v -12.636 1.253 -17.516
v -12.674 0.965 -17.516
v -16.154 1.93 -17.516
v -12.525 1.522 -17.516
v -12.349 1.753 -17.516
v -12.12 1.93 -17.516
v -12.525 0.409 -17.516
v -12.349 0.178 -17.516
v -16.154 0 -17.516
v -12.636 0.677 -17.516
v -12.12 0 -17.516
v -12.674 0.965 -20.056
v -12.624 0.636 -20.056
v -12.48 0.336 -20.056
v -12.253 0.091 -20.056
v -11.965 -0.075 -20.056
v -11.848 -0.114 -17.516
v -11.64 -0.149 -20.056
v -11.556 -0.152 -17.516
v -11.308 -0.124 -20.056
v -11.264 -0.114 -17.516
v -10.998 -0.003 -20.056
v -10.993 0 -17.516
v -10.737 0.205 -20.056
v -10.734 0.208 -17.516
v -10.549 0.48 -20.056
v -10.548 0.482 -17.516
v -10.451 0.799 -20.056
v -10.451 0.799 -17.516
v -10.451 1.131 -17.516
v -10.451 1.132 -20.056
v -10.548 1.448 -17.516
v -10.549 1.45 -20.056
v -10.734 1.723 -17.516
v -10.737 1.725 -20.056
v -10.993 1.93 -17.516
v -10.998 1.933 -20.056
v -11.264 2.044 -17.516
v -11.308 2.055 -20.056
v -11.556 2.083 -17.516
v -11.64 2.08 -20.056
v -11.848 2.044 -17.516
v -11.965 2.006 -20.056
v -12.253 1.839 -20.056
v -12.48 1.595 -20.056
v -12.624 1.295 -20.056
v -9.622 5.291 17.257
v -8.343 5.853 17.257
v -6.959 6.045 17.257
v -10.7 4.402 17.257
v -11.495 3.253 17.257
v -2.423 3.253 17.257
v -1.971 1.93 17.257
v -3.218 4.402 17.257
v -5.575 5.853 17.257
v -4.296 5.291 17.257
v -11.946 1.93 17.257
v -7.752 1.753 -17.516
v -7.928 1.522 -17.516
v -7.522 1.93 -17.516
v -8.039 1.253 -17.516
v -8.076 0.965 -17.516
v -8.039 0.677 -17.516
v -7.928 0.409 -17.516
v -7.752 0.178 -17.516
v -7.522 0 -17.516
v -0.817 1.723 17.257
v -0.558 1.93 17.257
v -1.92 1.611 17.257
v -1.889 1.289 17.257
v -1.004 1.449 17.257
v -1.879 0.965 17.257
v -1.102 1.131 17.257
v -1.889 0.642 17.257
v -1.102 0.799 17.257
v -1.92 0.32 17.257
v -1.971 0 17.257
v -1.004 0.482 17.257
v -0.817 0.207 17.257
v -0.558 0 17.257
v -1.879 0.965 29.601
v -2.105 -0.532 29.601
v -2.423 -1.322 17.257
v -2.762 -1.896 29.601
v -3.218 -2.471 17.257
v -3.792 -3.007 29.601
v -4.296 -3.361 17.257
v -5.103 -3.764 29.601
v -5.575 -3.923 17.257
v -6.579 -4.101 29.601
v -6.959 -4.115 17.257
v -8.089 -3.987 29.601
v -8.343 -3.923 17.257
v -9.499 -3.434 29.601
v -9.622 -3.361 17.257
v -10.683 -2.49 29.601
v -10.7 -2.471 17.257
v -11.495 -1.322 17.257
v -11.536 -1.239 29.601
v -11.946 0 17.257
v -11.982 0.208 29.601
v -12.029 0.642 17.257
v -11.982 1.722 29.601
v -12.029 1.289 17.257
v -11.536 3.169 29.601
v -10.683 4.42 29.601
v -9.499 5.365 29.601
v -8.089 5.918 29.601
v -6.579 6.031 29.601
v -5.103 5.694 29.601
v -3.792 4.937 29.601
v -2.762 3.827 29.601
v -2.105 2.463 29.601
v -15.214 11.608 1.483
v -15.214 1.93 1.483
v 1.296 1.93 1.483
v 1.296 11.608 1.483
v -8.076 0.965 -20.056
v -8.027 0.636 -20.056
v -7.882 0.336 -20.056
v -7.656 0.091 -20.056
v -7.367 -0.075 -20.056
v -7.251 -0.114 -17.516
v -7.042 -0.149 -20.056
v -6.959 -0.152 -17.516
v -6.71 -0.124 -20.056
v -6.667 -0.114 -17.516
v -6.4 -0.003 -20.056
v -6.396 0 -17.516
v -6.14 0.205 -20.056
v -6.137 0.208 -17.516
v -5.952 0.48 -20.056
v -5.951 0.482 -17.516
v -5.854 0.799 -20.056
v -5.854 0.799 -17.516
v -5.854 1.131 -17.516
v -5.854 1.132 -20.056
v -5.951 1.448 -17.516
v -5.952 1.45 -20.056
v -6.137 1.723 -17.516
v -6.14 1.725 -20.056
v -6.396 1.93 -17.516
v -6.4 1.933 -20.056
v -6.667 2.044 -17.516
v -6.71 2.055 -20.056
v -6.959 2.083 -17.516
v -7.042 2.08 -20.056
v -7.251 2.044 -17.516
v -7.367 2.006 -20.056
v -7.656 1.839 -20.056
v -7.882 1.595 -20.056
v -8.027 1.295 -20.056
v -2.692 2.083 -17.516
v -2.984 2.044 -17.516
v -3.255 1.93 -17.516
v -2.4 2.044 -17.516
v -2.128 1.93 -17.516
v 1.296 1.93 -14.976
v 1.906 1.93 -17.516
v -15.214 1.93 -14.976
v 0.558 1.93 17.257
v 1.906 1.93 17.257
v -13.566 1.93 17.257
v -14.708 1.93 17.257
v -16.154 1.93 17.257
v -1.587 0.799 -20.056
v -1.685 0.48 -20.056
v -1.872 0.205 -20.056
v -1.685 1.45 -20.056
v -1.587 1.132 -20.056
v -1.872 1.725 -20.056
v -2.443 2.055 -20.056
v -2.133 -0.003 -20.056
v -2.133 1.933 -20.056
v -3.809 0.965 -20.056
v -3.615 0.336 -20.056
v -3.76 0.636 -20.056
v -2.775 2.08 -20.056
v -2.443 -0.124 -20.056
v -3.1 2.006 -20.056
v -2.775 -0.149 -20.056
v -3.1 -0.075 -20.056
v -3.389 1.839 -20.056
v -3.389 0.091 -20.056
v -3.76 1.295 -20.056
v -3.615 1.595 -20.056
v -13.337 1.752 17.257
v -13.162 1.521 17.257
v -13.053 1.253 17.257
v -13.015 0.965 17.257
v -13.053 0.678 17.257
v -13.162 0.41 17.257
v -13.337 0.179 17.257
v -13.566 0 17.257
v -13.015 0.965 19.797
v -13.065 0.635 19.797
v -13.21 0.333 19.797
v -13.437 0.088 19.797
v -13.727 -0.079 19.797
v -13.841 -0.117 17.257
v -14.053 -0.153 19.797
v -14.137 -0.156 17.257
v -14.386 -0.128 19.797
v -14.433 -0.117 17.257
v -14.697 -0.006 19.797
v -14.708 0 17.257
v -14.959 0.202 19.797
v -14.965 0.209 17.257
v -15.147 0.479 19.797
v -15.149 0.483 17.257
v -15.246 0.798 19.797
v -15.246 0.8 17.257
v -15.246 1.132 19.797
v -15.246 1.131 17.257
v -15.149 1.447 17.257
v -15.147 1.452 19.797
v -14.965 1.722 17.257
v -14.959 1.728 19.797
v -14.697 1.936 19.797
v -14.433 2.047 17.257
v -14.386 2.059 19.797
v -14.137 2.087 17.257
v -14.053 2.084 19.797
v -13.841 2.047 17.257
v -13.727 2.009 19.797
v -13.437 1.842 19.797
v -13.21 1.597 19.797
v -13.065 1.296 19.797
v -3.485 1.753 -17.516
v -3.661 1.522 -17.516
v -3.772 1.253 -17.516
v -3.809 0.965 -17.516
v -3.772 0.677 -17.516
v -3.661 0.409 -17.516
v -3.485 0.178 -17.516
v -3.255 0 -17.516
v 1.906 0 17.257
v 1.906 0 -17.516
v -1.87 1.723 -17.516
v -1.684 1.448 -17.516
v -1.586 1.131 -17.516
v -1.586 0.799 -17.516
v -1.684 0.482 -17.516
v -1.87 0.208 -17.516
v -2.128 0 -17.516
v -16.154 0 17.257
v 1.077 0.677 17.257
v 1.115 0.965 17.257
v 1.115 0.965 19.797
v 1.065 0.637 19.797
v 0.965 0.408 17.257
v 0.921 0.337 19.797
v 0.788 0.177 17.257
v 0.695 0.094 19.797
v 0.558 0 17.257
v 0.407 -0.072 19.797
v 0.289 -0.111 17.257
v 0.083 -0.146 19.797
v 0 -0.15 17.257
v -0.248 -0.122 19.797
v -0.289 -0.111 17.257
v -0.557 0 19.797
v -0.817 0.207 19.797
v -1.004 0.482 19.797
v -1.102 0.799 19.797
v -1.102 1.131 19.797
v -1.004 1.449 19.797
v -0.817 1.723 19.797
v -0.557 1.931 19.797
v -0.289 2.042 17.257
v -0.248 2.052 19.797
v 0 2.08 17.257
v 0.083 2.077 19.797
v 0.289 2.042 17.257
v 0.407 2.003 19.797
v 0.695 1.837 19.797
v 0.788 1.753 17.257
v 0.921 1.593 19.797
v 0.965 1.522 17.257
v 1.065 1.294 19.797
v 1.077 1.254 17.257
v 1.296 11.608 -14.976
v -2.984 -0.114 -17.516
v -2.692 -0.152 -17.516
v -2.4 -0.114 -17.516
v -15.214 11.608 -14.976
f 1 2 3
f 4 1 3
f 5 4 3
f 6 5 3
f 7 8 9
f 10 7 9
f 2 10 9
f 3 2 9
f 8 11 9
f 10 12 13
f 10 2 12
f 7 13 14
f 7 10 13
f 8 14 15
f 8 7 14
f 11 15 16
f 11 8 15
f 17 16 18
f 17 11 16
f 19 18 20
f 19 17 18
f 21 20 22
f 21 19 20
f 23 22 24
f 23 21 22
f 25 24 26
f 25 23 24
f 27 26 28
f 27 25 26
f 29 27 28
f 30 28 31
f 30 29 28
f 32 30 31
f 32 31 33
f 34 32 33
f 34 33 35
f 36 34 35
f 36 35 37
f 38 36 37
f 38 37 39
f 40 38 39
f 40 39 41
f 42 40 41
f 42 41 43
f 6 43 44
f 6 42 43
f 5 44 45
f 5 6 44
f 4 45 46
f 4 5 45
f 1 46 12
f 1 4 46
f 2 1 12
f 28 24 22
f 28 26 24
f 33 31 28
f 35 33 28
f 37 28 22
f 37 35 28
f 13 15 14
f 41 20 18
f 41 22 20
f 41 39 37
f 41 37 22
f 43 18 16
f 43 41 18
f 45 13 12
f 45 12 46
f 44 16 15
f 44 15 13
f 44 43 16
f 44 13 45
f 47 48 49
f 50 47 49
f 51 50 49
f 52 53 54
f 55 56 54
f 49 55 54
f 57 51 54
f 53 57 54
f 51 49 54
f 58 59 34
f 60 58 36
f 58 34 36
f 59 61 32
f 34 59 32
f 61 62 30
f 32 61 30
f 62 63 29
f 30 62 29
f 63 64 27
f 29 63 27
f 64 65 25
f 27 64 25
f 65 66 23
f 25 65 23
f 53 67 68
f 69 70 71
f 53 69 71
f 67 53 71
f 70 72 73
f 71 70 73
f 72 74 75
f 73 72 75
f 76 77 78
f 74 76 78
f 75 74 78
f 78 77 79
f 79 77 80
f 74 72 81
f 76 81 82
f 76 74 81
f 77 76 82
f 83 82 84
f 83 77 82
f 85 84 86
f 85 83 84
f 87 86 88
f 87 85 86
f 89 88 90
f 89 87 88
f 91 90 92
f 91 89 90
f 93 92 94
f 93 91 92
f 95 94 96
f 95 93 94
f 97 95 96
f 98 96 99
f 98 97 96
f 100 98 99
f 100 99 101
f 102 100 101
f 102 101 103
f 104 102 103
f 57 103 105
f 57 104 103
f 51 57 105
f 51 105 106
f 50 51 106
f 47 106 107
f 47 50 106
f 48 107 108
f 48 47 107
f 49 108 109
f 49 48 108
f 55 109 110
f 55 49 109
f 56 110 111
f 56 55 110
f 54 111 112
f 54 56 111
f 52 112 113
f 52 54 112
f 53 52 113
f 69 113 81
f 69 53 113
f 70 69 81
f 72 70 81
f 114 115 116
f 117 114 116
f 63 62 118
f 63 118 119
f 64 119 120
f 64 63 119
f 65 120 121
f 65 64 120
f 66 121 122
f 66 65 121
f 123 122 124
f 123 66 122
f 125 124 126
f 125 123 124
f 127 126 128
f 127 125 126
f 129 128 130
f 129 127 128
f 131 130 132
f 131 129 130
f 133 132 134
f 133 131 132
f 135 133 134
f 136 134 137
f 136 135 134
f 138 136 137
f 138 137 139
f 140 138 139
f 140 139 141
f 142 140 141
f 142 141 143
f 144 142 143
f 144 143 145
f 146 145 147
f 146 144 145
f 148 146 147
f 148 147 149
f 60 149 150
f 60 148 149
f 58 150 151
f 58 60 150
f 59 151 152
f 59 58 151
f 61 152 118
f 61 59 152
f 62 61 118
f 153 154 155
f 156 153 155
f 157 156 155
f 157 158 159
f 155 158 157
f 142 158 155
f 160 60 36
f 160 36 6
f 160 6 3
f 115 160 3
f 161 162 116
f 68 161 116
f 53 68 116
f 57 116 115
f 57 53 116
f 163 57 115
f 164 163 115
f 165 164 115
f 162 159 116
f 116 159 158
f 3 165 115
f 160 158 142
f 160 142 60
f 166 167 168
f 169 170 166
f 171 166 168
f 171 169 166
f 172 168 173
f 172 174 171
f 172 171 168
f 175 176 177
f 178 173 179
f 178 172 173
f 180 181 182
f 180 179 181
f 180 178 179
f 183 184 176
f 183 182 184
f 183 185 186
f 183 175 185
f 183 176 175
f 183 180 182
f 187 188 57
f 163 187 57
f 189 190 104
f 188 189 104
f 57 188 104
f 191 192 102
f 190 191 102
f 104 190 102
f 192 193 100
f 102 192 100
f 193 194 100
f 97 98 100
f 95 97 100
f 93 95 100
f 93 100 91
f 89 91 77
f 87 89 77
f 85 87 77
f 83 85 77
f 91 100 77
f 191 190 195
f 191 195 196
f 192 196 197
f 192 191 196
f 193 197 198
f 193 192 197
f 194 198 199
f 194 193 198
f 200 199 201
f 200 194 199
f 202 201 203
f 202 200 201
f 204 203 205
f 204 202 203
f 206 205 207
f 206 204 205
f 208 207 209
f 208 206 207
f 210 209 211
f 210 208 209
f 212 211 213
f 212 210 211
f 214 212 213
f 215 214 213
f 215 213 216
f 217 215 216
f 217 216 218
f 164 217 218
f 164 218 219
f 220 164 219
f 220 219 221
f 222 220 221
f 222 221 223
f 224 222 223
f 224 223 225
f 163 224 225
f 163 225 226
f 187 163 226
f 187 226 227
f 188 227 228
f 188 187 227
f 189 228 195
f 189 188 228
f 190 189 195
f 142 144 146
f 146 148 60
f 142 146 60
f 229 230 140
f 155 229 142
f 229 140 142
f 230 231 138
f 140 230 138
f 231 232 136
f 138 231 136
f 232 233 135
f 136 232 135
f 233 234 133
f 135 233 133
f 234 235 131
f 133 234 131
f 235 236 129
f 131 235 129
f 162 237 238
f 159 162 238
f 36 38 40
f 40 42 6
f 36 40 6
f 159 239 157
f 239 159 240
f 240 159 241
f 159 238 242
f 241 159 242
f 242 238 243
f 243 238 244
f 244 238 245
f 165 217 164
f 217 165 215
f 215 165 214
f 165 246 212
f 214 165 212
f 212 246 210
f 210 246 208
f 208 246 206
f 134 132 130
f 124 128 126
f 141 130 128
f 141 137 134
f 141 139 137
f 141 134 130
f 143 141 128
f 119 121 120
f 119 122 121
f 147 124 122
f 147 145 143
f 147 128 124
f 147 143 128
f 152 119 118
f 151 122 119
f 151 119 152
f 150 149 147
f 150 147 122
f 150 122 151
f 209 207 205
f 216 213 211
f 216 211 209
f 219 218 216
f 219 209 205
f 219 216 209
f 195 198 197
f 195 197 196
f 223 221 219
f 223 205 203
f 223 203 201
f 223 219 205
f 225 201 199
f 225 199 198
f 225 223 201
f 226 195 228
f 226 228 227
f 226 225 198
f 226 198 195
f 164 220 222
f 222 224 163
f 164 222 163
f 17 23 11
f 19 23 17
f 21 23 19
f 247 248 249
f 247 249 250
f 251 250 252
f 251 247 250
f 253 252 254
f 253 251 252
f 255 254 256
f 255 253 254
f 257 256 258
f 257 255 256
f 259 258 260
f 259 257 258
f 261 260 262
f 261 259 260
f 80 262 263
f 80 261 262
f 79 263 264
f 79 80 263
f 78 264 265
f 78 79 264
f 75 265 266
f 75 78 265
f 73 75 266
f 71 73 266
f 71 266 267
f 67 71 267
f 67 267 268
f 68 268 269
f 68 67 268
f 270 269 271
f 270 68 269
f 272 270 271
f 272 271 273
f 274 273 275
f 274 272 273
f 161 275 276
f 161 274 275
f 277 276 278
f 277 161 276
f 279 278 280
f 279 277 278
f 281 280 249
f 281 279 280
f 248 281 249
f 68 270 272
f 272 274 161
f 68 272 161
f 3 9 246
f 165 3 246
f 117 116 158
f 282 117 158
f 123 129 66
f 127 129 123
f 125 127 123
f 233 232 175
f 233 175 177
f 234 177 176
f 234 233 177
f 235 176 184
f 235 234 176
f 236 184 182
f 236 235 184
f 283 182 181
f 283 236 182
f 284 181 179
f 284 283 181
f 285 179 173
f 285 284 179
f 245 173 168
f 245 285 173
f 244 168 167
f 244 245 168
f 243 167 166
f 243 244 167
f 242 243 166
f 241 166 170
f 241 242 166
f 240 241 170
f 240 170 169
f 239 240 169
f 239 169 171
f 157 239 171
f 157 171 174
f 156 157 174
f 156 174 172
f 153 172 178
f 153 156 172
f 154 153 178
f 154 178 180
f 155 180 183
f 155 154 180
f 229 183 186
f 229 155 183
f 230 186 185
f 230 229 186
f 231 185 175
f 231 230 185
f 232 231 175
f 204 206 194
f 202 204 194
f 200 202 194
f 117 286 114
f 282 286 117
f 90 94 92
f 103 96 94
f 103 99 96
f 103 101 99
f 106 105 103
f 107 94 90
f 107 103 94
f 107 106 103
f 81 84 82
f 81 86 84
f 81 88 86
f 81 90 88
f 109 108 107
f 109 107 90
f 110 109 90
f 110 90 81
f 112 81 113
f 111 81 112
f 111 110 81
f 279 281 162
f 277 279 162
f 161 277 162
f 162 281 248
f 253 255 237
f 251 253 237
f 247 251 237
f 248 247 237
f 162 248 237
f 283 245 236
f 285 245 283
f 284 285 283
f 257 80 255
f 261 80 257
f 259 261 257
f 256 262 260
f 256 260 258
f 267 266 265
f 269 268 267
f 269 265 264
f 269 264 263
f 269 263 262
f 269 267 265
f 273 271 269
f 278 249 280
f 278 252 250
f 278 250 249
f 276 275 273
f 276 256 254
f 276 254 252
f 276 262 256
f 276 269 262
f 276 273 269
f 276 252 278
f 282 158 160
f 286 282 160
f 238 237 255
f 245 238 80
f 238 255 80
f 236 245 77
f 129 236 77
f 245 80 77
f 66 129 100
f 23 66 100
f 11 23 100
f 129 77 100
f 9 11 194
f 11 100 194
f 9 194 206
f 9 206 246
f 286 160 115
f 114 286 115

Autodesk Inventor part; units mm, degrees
ref_plane "YZ Plane" through (0, 0, 0) normal (1, 0, 0) x (0, 1, 0)
ref_plane "XZ Plane" through (0, 0, 0) normal (0, 1, 0) x (-1, 0, 0)
ref_plane "XY Plane" through (0, 0, 0) normal (0, 0, 1) x (1, 0, 0)
sketch "Sketch1" plane through (0, 0, 0) normal (0, 1, 0) x (-1, 0, 0)
  line L0 (16.1537, 17.2566) -> (-1.9057, 17.2566)
  line L1 (-1.9057, 17.2566) -> (-1.9057, -17.516)
  line L2 (-1.9057, -17.516) -> (16.1537, -17.516)
  line L3 (16.1537, -17.516) -> (16.1537, 17.2566)
  point P0 (0, 0)
  dimension "d0" = 34.7726
  dimension "d1" = 18.0594
extrude "Extrusion1" add sketch "Sketch1" along normal blind 1.9304
sketch "Sketch2" plane through (0, 1.9304, 0) normal (0, 1, 0) x (1, 0, 0)
  line L0 (-15.2139, -1.4832) -> (1.2961, -1.4832)
  line L1 (1.2961, -1.4832) -> (1.2961, 14.976)
  line L2 (1.2961, 14.976) -> (-15.2139, 14.976)
  line L3 (-15.2139, 14.976) -> (-15.2139, -1.4832)
  line L4 (1.9057, -17.2566) -> (1.9057, 17.516) projected
  line L5 (1.9057, 17.516) -> (-16.1537, 17.516) projected
  line L6 (-16.1537, -17.2566) -> (1.9057, -17.2566) projected
  point P0 (0, 0)
  dimension "d4" = 16.4592
  dimension "d5" = 16.51
  dimension "d6" = 0.6096
  dimension "d9" = 15.7734
extrude "Extrusion2" add sketch "Sketch2" along normal blind 9.6774
sketch "Sketch3" plane through (-16.1537, 0, 17.2566) normal (0, 0, 1) x (1, 0, 0)
  line L0 (17.4498, 1.9304) -> (0.9398, 1.9304) projected
  line L1 (9.1948, 1.9304) -> (9.1948, -4.4517)
  line L2 (18.0594, 0) -> (18.0594, 1.9304) projected
  line L3 (18.0594, 0.9652) -> (-4.716, 0.9652)
  circle A0 centre (9.1948, 0.9652) radius 5.08
  point P0 (16.1537, 0)
  dimension "d12" = 10.16
extrude "Extrusion3" add sketch "Sketch3" along normal blind 12.3444
sketch "Sketch4" plane through (1.9057, 0, -17.516) normal (0, 0, -1) x (-1, 0, 0)
  line L0 (0, 0) -> (0, 1.9304) projected
  line L1 (0, 0.9652) -> (18.0594, 0.9652)
  line L2 (18.0594, 0) -> (18.0594, 1.9304) projected
  line L3 (13.8521, 1.9304) -> (3.8771, 1.9304) projected
  line L4 (8.8646, 1.9304) -> (8.8646, -5.2451)
  line L5 (18.0594, 1.3992) -> (13.462, 1.3992)
  line L6 (13.462, 1.9304) -> (13.462, -4.7459)
  line L7 (0, 1.6034) -> (4.5974, 1.6034)
  line L8 (4.5974, 1.9304) -> (4.5974, -5.3585)
  circle A0 centre (4.5974, 0.9652) radius 1.1176
  circle A1 centre (8.8646, 0.9652) radius 1.1176
  circle A2 centre (13.462, 0.9652) radius 1.1176
  point P0 (1.9057, 0)
  dimension "d15" = 9.1948
  dimension "d16" = 4.5974
  dimension "d17" = 4.5974
  dimension "d18" = 2.2352
  dimension "d19" = 2.2352
  dimension "d20" = 2.2352
extrude "Extrusion4" add sketch "Sketch4" along normal blind 2.54 contours A0 L7 L8 L1 | L1 L8 A0 | A0 L3 L8 L7 | L8 L3 A0 L1 | L1 A0 L8 | A0 L3 | A1 L3 L4 L1 | L1 L4 A1 | A1 L3 | L4 L3 A1 L1 | L1 A1 L4 | A2 L5 L6 L3 | L3 L6 L1 A2 | L1 L6 A2 | A2 L1 L6 L5 | L1 A2 L6
sketch "Sketch5" plane through (1.9057, 0, 17.2566) normal (0, 0, 1) x (1, 0, 0)
  circle A0 centre (-1.9057, 0.9652) radius 1.1147
  circle A1 centre (-16.0424, 0.9652) radius 1.1215
  point P0 (-1.9057, 0)
extrude "Extrusion5" add sketch "Sketch5" along normal blind 2.54
equation "\"d19\" = d18"
equation "\"d20\" = d18"
properties part number "Motor Driver"
